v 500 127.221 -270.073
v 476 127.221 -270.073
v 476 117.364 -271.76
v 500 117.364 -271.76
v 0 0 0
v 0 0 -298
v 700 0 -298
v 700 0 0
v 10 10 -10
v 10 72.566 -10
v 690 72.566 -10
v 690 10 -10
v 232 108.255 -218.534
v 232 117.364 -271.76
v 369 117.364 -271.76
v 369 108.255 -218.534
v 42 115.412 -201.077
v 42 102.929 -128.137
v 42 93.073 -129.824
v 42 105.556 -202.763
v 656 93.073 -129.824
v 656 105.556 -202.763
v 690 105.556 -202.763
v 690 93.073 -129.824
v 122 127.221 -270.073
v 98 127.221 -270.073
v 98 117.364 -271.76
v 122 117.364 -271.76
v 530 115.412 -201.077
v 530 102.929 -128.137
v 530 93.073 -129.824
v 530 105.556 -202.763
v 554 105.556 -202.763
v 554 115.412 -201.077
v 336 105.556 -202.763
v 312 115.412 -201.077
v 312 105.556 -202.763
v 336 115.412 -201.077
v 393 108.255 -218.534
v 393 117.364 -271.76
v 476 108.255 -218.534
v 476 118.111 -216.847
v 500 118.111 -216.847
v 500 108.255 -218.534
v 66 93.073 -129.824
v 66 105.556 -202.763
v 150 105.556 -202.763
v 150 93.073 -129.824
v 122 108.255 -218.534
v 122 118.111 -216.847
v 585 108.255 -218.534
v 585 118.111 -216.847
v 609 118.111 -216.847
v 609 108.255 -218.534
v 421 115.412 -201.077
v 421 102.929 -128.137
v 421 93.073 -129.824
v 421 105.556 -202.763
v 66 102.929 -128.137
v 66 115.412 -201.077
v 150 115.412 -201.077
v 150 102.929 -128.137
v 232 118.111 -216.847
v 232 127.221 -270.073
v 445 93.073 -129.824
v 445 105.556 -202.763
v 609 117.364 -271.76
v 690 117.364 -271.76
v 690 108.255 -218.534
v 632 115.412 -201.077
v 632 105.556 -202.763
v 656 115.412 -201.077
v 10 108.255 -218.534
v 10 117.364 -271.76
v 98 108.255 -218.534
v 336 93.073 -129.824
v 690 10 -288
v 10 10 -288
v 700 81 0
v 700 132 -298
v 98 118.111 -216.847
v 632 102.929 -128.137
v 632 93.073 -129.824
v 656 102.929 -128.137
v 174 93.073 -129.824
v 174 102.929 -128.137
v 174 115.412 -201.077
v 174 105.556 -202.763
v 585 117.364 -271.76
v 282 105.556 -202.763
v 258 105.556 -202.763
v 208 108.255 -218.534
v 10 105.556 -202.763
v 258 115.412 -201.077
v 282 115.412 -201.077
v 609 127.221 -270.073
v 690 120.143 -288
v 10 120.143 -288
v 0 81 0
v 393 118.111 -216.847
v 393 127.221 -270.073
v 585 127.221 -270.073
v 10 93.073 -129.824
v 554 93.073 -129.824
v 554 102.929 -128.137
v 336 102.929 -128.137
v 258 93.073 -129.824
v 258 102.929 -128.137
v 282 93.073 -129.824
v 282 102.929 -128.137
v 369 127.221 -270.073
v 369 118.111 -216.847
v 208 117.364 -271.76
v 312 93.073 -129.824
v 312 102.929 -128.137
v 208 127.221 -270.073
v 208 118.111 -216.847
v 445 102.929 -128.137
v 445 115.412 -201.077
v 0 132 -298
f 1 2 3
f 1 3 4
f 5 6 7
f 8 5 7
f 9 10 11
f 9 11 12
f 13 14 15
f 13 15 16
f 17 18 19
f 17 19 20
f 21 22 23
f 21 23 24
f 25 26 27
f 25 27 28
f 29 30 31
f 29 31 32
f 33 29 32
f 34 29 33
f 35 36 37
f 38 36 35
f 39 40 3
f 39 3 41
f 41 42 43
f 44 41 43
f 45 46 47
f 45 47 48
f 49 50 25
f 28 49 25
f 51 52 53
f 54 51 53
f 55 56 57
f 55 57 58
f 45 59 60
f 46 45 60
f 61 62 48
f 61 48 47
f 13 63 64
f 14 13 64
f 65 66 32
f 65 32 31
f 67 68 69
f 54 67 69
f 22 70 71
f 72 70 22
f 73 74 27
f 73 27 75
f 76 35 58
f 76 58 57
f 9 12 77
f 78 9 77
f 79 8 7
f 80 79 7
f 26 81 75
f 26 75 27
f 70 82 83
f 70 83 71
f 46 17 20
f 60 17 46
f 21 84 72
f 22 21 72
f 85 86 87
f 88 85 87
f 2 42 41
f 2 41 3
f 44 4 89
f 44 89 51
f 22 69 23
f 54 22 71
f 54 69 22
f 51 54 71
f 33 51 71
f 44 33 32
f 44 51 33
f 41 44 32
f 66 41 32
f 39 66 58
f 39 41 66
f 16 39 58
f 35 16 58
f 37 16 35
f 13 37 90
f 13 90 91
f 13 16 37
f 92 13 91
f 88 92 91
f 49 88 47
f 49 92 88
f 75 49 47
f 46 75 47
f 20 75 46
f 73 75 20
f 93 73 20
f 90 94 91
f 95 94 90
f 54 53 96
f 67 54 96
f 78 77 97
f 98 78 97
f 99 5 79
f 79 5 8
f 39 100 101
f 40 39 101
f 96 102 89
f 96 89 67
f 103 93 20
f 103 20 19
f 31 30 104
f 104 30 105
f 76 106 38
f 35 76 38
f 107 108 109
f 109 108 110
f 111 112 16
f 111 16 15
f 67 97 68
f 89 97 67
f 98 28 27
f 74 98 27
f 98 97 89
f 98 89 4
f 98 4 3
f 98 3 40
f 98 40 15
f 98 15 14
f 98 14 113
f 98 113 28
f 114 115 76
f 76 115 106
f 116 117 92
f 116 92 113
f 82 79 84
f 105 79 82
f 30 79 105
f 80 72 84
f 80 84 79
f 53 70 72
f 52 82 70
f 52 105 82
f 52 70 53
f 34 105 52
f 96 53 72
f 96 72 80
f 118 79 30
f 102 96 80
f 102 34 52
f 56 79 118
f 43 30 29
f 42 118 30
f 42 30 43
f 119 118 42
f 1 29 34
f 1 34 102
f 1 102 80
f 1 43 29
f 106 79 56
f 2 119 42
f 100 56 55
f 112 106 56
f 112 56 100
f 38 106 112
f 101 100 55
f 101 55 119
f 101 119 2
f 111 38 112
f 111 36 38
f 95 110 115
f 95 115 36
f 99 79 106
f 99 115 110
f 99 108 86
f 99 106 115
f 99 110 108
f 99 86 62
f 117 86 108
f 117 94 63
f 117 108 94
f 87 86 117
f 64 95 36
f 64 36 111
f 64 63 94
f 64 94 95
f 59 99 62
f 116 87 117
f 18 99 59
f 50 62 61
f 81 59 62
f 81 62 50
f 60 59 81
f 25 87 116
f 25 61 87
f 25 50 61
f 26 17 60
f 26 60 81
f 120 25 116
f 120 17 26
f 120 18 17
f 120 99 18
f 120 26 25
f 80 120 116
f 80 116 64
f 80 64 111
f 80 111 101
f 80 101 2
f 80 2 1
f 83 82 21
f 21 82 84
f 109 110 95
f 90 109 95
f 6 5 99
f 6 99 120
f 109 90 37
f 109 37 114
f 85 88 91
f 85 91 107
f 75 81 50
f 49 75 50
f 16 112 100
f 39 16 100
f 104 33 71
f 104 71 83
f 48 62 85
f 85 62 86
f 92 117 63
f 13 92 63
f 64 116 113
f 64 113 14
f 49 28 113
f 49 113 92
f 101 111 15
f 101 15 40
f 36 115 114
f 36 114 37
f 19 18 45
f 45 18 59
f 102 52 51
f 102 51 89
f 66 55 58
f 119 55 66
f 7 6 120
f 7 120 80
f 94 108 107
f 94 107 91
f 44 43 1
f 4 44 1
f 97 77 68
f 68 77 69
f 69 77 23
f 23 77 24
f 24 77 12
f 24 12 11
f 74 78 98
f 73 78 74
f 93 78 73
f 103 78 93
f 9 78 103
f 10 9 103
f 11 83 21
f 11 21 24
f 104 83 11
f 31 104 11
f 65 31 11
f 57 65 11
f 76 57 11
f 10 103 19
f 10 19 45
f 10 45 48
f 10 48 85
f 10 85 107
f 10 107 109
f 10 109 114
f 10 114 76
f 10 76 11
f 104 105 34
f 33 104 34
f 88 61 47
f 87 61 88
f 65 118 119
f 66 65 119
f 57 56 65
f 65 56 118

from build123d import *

# Parameters (mm, degrees)
CROQUIS1_W              = 700
CROQUIS1_H              = 298
SALIENTE_EXTRUIR1_DEPTH = 132
CORTAR_EXTRUIR1_DEPTH   = 773.158014917
CROQUIS5_W              = 24
CROQUIS5_H              = 74
CROQUIS5_H_2            = 54
CORTAR_EXTRUIR2_DEPTH   = 10
VACIADO2_START          = 10
VACIADO2_DEPTH          = 680


# Read off the part's stored shape, not the designer's step: Vaciado2
with BuildPart() as part:
    # Croquis1 → Saliente-Extruir1 (new body)
    with BuildSketch(Plane(origin=(0, 0, 0), x_dir=(1, 0, 0), z_dir=(0, 1, 0))):
        with Locations((350, 149)):
            Rectangle(CROQUIS1_W, CROQUIS1_H)
    extrude(amount=SALIENTE_EXTRUIR1_DEPTH)

    # Croquis3 → Cortar-Extruir1 (cut, through all)
    with BuildSketch(Plane.ZY):
        Polygon((0, 81), (-298, 132), (0, 132), align=None)
    extrude(amount=-CORTAR_EXTRUIR1_DEPTH, mode=Mode.SUBTRACT)

    # Croquis5 → Cortar-Extruir2 (cut)
    with BuildSketch(Plane(origin=(0, 78.695082326, 13.467950331), x_dir=(1, 0, 0), z_dir=(0, 0.9856694305119892, 0.16868839247017262))):
        with Locations((54, 180.66375979)):
            Rectangle(CROQUIS5_W, CROQUIS5_H)
        with Locations((162, 180.66375979)):
            Rectangle(CROQUIS5_W, CROQUIS5_H)
        with Locations((270, 180.66375979)):
            Rectangle(CROQUIS5_W, CROQUIS5_H)
        with Locations((324, 180.66375979)):
            Rectangle(CROQUIS5_W, CROQUIS5_H)
        with Locations((433, 180.66375979)):
            Rectangle(CROQUIS5_W, CROQUIS5_H)
        with Locations((542, 180.66375979)):
            Rectangle(CROQUIS5_W, CROQUIS5_H)
        with Locations((644, 180.66375979)):
            Rectangle(CROQUIS5_W, CROQUIS5_H)
        with Locations((110, 260.66375979)):
            Rectangle(CROQUIS5_W, CROQUIS5_H_2)
        with Locations((220, 260.66375979)):
            Rectangle(CROQUIS5_W, CROQUIS5_H_2)
        with Locations((381, 260.66375979)):
            Rectangle(CROQUIS5_W, CROQUIS5_H_2)
        with Locations((488, 260.66375979)):
            Rectangle(CROQUIS5_W, CROQUIS5_H_2)
        with Locations((597, 260.66375979)):
            Rectangle(CROQUIS5_W, CROQUIS5_H_2)
    extrude(amount=-CORTAR_EXTRUIR2_DEPTH, mode=Mode.SUBTRACT)

    # Vaciado2 outline → Vaciado2 (cut)
    with BuildSketch(Plane.YZ.offset(VACIADO2_START)):
        Polygon((93.072796716, -129.823909891), (72.566020191, -10), (10, -10), (10, -288), (120.143201399, -288), (117.363925232, -271.760307885), (108.254752038, -218.534158637), (105.555737759, -202.763447749), align=None)
    extrude(amount=VACIADO2_DEPTH, mode=Mode.SUBTRACT)


solid = part.part
